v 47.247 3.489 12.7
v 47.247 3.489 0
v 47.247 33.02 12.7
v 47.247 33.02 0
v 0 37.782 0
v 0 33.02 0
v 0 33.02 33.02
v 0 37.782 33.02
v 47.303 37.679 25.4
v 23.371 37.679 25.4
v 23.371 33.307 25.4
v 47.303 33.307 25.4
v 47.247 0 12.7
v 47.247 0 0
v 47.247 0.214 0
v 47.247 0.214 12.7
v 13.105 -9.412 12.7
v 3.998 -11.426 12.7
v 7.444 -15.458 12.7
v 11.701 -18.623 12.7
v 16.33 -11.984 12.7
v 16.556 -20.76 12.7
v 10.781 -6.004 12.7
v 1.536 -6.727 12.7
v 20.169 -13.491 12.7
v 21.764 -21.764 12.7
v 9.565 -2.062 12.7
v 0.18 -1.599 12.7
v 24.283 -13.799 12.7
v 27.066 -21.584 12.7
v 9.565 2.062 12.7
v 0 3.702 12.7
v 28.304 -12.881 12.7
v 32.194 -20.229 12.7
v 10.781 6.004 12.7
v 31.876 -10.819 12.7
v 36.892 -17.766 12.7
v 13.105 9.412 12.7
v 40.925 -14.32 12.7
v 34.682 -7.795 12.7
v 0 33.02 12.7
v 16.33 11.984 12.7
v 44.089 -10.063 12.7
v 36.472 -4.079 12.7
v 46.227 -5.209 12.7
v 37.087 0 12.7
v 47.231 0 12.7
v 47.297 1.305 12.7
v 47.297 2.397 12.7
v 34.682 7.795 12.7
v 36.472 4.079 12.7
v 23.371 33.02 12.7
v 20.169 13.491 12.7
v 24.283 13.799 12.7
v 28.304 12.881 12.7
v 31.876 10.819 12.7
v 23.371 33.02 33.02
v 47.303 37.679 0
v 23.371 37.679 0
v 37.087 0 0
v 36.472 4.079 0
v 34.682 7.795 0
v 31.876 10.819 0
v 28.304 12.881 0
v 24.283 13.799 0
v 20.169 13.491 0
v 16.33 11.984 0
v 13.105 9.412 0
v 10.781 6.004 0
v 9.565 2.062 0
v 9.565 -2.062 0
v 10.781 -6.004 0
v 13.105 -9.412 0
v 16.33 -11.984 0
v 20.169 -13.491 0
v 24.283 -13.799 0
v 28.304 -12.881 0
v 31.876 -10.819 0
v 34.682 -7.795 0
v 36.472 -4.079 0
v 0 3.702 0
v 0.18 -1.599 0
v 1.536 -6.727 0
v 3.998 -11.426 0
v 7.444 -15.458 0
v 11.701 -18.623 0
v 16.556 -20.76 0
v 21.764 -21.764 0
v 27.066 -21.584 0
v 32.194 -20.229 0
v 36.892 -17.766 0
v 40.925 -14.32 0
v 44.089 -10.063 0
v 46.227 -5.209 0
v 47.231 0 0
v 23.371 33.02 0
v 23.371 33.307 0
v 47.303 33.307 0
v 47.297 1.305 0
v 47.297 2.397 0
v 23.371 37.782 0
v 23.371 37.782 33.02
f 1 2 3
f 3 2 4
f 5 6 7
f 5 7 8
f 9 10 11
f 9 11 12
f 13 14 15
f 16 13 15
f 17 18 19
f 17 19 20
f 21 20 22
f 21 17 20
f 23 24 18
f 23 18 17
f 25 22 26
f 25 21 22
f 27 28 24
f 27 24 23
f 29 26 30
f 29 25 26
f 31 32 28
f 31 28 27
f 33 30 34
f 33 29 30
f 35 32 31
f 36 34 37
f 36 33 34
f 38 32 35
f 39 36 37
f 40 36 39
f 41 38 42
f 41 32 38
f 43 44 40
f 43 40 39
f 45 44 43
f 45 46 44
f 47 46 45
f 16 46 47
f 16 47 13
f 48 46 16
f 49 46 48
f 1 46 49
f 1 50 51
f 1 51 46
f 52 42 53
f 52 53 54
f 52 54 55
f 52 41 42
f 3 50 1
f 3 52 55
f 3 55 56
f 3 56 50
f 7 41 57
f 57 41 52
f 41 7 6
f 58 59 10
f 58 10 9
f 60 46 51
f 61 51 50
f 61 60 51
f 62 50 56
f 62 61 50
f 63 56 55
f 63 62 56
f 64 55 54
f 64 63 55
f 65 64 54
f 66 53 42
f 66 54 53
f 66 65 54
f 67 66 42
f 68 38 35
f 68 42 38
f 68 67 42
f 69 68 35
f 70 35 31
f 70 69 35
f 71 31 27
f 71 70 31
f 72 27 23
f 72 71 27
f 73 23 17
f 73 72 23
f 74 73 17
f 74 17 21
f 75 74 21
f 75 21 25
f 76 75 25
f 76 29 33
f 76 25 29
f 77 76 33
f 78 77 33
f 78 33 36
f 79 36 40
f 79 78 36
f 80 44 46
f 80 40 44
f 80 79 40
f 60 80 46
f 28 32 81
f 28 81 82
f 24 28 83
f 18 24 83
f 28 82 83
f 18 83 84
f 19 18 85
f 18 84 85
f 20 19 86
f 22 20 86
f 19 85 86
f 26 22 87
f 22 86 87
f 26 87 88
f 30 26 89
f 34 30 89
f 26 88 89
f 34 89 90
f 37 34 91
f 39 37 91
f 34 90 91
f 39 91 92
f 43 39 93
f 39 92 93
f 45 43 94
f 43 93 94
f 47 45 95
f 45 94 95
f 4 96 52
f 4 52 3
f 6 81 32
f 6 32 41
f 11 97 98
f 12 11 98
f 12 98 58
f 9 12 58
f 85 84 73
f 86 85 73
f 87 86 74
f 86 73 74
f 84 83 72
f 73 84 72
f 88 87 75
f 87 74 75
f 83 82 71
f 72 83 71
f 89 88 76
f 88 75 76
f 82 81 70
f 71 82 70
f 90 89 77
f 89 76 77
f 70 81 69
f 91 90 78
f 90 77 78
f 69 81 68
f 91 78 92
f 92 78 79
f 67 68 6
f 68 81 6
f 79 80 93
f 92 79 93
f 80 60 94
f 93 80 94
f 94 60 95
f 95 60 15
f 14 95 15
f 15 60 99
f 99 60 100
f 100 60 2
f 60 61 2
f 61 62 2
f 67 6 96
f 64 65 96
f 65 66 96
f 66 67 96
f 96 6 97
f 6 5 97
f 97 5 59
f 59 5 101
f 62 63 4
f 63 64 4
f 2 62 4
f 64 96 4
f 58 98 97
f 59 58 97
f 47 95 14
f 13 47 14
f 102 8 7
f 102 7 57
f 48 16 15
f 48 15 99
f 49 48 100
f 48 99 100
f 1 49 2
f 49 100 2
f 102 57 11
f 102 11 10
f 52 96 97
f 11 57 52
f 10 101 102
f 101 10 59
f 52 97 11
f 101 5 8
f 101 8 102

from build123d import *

# Parameters (mm, degrees)
F0_W     = 47.24663
F0_H     = 33.02
F2_DEPTH = 12.7
F1_R     = 23.687869
F3_DEPTH = 12.7
F4_R     = 13.83799
F5_DEPTH = 12.701
F6_W     = 23.371061
F6_H     = 4.762498
F8_DEPTH = 33.02
F7_W     = 24.04602
F7_H     = 4.372004
F9_DEPTH = 25.4


with BuildPart() as f2:
    # F0 (on Top) → F2 (new body)
    with BuildSketch(Plane.XY):
        with Locations((23.623315, 16.51)):
            Rectangle(F0_W, F0_H)
    extrude(amount=F2_DEPTH)

    # F1 (on Top) → F3 (join)
    with BuildSketch(Plane.XY):
        with Locations((23.615431, 1.851092)):
            Circle(F1_R)
    extrude(amount=F3_DEPTH)

    # F4 (on Top) → F5 (cut, through all)
    with BuildSketch(Plane.XY):
        with Locations((23.24864, 0)):
            Circle(F4_R)
    extrude(amount=F5_DEPTH, mode=Mode.SUBTRACT)

    # F6 (on Top) → F8 (join)
    with BuildSketch(Plane.XY):
        with Locations((11.68553, 35.401249)):
            Rectangle(F6_W, F6_H)
    extrude(amount=F8_DEPTH)

    # F7 (on Top) → F9 (join)
    with BuildSketch(Plane.XY):
        with Locations((35.279802, 35.49272)):
            Rectangle(F7_W, F7_H)
    extrude(amount=F9_DEPTH)


solid = f2.part
